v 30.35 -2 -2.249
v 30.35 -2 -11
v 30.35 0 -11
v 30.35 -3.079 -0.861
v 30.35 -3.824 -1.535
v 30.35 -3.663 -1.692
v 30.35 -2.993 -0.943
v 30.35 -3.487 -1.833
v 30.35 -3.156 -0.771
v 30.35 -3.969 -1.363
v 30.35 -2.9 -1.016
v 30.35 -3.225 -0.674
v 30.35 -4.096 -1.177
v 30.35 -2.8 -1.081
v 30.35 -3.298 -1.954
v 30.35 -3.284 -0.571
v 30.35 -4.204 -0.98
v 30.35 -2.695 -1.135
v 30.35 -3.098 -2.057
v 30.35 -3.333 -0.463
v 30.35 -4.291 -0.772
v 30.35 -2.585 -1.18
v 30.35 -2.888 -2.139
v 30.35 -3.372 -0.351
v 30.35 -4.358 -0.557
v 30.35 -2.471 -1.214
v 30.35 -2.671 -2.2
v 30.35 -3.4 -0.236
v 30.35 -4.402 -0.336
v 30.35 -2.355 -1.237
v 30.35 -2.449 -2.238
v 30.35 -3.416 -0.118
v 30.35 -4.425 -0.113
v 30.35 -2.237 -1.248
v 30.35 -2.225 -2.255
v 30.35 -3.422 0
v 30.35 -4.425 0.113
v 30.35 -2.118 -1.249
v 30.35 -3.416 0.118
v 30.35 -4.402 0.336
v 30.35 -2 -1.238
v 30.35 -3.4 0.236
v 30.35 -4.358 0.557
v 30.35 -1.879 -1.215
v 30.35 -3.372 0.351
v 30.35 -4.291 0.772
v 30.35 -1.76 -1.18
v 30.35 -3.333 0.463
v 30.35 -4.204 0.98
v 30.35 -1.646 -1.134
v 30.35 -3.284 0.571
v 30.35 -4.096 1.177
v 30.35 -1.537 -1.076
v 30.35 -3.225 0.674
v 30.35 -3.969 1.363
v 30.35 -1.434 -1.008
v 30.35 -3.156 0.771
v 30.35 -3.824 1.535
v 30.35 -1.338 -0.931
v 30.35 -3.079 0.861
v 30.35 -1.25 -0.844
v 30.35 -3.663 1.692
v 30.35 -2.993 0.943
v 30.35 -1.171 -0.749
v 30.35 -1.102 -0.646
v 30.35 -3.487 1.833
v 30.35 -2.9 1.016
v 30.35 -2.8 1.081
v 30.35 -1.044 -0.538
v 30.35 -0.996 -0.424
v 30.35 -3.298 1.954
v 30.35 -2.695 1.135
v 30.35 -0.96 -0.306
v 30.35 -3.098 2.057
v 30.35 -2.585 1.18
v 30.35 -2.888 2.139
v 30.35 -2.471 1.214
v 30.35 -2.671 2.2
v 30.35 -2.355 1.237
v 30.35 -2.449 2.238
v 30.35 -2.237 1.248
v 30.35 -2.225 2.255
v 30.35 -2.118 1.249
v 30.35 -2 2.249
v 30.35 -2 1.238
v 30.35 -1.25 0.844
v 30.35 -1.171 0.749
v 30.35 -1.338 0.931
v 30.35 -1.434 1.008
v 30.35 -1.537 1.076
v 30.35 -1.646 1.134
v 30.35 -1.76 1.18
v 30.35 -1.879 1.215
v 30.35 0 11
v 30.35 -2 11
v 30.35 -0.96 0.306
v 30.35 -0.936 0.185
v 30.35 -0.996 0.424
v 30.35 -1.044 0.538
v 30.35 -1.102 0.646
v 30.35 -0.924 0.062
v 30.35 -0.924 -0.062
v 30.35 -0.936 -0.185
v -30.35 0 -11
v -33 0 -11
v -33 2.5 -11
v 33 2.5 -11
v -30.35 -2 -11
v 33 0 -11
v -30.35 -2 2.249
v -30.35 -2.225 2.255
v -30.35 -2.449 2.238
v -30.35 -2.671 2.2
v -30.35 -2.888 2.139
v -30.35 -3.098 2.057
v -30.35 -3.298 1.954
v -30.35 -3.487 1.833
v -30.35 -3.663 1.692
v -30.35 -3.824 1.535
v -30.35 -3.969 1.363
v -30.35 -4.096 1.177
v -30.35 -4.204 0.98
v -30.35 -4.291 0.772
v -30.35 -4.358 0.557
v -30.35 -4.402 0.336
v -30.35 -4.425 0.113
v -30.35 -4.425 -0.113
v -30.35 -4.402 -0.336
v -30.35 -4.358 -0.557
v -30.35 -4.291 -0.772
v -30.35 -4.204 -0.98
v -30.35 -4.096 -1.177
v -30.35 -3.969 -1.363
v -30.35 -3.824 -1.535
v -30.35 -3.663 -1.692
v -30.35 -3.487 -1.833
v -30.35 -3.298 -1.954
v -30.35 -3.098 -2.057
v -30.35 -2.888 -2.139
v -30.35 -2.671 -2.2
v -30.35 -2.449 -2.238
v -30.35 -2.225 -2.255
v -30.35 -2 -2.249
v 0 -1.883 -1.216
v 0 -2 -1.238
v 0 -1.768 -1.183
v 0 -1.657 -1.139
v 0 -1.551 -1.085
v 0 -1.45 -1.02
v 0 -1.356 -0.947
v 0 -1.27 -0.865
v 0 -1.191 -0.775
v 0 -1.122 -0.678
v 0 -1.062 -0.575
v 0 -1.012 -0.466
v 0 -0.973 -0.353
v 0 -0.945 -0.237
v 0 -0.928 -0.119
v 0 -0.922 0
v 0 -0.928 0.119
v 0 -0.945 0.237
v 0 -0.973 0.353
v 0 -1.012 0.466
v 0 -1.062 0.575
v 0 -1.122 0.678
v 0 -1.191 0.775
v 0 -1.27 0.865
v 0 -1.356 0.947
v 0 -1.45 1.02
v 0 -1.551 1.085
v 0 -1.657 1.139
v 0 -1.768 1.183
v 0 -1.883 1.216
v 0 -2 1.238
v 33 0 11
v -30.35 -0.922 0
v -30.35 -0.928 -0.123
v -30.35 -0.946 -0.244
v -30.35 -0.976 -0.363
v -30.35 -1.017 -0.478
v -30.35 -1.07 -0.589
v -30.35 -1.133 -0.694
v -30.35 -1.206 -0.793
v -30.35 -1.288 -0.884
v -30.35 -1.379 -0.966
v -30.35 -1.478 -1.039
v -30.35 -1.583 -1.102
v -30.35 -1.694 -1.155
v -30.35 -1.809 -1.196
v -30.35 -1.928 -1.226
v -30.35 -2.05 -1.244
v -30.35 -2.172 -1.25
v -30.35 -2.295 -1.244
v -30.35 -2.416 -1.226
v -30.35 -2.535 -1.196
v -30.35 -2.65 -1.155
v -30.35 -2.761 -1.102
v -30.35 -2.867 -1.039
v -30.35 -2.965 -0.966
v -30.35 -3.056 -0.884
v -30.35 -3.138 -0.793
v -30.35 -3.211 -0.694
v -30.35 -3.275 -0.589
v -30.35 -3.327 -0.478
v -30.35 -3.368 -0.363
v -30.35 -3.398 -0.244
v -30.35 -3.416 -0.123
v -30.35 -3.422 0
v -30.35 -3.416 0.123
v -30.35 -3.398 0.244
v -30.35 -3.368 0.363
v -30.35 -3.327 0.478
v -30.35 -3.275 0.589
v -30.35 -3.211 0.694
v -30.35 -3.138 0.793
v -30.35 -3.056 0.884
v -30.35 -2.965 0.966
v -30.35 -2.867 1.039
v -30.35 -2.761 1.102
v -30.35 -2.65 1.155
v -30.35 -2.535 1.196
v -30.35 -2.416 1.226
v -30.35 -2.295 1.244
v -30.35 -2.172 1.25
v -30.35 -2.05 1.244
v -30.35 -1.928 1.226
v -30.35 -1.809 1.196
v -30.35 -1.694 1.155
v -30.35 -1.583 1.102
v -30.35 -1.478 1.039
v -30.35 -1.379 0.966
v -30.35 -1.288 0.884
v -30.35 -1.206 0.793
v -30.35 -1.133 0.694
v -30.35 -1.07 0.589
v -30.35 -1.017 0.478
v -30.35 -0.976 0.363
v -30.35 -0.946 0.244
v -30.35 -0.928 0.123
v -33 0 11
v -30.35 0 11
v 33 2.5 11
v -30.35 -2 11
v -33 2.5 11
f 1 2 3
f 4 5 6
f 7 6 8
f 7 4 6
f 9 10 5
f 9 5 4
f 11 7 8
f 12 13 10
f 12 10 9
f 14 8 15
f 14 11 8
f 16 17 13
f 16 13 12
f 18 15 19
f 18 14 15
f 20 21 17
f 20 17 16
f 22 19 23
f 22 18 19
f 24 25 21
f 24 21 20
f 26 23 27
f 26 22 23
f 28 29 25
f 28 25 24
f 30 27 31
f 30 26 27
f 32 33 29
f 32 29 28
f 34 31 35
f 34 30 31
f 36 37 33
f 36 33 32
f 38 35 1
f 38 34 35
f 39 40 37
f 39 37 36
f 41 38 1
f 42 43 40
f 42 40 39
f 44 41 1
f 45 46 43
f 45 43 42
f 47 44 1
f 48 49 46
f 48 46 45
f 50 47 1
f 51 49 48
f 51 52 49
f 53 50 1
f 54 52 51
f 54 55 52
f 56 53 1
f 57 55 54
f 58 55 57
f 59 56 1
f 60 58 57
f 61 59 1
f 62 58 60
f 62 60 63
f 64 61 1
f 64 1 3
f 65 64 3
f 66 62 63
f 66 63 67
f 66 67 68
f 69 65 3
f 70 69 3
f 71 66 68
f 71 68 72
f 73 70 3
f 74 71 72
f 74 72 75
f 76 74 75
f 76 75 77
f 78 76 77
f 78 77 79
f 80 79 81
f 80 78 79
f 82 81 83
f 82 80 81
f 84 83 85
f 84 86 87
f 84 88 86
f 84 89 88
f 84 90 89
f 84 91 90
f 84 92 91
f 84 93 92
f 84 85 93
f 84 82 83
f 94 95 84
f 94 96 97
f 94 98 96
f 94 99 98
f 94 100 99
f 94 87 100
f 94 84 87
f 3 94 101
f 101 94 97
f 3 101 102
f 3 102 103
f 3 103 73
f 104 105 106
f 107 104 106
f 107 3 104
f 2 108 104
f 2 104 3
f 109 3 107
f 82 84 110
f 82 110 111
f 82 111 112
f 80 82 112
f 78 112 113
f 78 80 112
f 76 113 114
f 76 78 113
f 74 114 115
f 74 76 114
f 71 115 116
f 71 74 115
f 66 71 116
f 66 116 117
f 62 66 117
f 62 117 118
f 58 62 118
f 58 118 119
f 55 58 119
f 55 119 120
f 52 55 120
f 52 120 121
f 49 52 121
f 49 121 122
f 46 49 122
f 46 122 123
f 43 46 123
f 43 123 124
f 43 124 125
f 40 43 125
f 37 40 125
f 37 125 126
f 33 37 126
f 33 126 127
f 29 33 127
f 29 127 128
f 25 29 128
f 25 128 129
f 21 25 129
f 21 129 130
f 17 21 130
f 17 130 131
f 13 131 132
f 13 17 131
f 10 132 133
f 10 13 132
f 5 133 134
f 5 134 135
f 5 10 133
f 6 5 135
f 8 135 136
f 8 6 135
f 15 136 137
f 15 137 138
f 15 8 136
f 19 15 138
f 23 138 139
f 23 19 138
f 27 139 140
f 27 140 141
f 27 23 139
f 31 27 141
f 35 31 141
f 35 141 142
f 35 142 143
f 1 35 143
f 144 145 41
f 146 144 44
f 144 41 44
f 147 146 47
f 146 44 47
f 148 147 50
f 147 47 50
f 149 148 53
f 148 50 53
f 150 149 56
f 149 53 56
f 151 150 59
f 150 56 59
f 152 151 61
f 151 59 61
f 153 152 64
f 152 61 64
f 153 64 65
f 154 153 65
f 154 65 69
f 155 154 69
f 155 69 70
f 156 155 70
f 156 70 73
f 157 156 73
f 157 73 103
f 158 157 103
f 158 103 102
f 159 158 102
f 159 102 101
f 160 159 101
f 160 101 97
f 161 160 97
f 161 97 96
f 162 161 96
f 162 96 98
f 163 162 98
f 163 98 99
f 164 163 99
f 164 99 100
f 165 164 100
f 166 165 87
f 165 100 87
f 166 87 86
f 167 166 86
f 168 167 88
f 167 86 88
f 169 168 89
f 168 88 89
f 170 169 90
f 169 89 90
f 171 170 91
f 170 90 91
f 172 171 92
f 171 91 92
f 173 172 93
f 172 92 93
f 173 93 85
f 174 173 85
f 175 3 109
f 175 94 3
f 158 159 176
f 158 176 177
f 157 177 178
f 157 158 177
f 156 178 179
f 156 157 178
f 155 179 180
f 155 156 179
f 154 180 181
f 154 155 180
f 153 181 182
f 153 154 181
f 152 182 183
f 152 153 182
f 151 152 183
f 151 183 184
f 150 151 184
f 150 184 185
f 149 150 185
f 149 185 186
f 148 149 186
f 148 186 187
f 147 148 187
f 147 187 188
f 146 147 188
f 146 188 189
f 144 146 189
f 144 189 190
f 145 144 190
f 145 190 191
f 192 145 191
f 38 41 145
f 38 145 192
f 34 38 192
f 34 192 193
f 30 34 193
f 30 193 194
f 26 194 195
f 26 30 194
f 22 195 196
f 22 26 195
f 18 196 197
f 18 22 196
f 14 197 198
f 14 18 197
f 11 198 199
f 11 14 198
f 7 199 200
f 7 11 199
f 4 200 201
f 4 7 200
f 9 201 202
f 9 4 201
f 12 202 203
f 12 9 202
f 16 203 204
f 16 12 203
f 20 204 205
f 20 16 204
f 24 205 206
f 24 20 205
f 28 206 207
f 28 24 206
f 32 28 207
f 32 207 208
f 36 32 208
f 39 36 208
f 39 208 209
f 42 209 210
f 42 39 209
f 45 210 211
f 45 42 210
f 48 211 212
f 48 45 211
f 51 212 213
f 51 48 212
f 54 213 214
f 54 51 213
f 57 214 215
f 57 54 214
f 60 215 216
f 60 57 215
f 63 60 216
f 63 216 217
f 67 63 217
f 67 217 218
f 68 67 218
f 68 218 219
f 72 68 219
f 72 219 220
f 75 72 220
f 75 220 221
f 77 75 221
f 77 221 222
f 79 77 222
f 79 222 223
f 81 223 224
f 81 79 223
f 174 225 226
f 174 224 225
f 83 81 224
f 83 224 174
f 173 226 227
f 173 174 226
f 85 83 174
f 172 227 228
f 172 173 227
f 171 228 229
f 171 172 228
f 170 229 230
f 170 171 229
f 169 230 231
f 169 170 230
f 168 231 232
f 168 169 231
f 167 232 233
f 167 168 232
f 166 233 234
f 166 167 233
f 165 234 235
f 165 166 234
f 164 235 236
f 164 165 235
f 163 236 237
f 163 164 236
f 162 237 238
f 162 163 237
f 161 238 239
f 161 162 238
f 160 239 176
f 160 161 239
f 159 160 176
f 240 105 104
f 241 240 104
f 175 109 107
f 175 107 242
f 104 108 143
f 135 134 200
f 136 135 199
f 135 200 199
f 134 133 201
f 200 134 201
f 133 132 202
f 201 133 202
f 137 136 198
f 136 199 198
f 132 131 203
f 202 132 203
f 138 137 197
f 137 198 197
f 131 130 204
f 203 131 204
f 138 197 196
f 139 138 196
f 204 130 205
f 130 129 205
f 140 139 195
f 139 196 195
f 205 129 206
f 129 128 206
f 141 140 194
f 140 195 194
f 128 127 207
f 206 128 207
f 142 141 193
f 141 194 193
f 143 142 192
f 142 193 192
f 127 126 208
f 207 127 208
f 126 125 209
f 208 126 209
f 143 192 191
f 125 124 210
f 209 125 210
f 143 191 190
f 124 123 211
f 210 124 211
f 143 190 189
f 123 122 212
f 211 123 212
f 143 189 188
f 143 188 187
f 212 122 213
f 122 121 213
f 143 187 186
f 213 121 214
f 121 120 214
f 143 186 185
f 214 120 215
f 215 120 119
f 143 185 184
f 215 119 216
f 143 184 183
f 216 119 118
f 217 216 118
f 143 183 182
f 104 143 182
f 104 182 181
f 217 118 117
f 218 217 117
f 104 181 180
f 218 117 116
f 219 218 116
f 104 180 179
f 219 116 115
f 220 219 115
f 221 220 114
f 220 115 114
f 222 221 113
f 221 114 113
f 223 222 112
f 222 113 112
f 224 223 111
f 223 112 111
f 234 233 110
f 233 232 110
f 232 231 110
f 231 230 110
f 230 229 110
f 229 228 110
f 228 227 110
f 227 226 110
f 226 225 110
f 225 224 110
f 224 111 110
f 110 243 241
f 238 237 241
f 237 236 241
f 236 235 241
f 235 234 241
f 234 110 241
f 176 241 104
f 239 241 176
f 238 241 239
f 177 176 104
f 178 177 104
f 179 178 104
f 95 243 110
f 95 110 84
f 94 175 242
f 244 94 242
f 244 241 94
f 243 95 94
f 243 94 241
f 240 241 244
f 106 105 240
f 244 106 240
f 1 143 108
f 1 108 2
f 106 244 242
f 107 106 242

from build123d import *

# Parameters (mm, degrees)
F0_W      = 60.7
F0_H      = 22
F1_DEPTH  = 2
F0_W_2    = 2.65
F2_DEPTH  = 2.5
F1_FACE_W = 2
F1_FACE_H = 22
F4_DEPTH  = 30.35
F5_DEPTH  = 30.35
F6_D      = 2.5
F6_DEPTH  = 33.001
F7_D      = 2.5


with BuildPart() as f1:
    # F0 (on Front) → F1 (new body)
    with BuildSketch(Plane.XZ):
        Rectangle(F0_W, F0_H)
    extrude(amount=F1_DEPTH)

    # F0 (on Front) → F2 (join)
    with BuildSketch(Plane.XZ):
        with Locations((31.675, 0)):
            Rectangle(F0_W_2, F0_H)
        Rectangle(F0_W, F0_H)
        with Locations((-31.675, 0)):
            Rectangle(F0_W_2, F0_H)
    extrude(amount=-F2_DEPTH)

    # F3 (on Right) + F1_face (on face) → F4 (join)
    with BuildSketch(Plane.YZ):
        with BuildLine():
            ThreePointArc((0.0834241115, 0), (-2.1721045963, 2.2555287078), (-4.4276333041, 0))
            ThreePointArc((-4.4276333041, 0), (-2.1721045963, -2.2555287078), (0.0834241115, 0))
        make_face()
        with BuildLine():
            ThreePointArc((-3.4221045963, 0), (-2.1721045963, 1.25), (-0.9221045963, 0))
            ThreePointArc((-0.9221045963, 0), (-2.1721045963, -1.25), (-3.4221045963, 0))
        make_face(mode=Mode.SUBTRACT)
    with BuildSketch(Plane(origin=(-30.35, -1, 0), x_dir=(0, -1, 0), z_dir=(-1, 0, 0))):
        Rectangle(F1_FACE_W, F1_FACE_H)
    extrude(amount=F4_DEPTH, dir=(1, 0, 0))

    # F3 (on Right) → F5 (join)
    with BuildSketch(Plane.YZ):
        with BuildLine():
            ThreePointArc((0.0834241115, 0), (-2.1721045963, 2.2555287078), (-4.4276333041, 0))
            ThreePointArc((-4.4276333041, 0), (-2.1721045963, -2.2555287078), (0.0834241115, 0))
        make_face()
        with BuildLine():
            ThreePointArc((-3.4221045963, 0), (-2.1721045963, 1.25), (-0.9221045963, 0))
            ThreePointArc((-0.9221045963, 0), (-2.1721045963, -1.25), (-3.4221045963, 0))
        make_face(mode=Mode.SUBTRACT)
    extrude(amount=-F5_DEPTH)

    # F6 (through all, one way)
    with BuildSketch(Plane.YZ):
        with Locations((-2.1721045963, 0)):
            Circle(F6_D / 2)
    extrude(amount=-F6_DEPTH, mode=Mode.SUBTRACT)

    # F7 (through all)
    with Locations(Plane(origin=(0, 0, 0), x_dir=(0, 1, 0), z_dir=(-1, 0, 0))):
        with Locations((-2.1721045963, 0)):
            Hole(F7_D / 2)


solid = f1.part
